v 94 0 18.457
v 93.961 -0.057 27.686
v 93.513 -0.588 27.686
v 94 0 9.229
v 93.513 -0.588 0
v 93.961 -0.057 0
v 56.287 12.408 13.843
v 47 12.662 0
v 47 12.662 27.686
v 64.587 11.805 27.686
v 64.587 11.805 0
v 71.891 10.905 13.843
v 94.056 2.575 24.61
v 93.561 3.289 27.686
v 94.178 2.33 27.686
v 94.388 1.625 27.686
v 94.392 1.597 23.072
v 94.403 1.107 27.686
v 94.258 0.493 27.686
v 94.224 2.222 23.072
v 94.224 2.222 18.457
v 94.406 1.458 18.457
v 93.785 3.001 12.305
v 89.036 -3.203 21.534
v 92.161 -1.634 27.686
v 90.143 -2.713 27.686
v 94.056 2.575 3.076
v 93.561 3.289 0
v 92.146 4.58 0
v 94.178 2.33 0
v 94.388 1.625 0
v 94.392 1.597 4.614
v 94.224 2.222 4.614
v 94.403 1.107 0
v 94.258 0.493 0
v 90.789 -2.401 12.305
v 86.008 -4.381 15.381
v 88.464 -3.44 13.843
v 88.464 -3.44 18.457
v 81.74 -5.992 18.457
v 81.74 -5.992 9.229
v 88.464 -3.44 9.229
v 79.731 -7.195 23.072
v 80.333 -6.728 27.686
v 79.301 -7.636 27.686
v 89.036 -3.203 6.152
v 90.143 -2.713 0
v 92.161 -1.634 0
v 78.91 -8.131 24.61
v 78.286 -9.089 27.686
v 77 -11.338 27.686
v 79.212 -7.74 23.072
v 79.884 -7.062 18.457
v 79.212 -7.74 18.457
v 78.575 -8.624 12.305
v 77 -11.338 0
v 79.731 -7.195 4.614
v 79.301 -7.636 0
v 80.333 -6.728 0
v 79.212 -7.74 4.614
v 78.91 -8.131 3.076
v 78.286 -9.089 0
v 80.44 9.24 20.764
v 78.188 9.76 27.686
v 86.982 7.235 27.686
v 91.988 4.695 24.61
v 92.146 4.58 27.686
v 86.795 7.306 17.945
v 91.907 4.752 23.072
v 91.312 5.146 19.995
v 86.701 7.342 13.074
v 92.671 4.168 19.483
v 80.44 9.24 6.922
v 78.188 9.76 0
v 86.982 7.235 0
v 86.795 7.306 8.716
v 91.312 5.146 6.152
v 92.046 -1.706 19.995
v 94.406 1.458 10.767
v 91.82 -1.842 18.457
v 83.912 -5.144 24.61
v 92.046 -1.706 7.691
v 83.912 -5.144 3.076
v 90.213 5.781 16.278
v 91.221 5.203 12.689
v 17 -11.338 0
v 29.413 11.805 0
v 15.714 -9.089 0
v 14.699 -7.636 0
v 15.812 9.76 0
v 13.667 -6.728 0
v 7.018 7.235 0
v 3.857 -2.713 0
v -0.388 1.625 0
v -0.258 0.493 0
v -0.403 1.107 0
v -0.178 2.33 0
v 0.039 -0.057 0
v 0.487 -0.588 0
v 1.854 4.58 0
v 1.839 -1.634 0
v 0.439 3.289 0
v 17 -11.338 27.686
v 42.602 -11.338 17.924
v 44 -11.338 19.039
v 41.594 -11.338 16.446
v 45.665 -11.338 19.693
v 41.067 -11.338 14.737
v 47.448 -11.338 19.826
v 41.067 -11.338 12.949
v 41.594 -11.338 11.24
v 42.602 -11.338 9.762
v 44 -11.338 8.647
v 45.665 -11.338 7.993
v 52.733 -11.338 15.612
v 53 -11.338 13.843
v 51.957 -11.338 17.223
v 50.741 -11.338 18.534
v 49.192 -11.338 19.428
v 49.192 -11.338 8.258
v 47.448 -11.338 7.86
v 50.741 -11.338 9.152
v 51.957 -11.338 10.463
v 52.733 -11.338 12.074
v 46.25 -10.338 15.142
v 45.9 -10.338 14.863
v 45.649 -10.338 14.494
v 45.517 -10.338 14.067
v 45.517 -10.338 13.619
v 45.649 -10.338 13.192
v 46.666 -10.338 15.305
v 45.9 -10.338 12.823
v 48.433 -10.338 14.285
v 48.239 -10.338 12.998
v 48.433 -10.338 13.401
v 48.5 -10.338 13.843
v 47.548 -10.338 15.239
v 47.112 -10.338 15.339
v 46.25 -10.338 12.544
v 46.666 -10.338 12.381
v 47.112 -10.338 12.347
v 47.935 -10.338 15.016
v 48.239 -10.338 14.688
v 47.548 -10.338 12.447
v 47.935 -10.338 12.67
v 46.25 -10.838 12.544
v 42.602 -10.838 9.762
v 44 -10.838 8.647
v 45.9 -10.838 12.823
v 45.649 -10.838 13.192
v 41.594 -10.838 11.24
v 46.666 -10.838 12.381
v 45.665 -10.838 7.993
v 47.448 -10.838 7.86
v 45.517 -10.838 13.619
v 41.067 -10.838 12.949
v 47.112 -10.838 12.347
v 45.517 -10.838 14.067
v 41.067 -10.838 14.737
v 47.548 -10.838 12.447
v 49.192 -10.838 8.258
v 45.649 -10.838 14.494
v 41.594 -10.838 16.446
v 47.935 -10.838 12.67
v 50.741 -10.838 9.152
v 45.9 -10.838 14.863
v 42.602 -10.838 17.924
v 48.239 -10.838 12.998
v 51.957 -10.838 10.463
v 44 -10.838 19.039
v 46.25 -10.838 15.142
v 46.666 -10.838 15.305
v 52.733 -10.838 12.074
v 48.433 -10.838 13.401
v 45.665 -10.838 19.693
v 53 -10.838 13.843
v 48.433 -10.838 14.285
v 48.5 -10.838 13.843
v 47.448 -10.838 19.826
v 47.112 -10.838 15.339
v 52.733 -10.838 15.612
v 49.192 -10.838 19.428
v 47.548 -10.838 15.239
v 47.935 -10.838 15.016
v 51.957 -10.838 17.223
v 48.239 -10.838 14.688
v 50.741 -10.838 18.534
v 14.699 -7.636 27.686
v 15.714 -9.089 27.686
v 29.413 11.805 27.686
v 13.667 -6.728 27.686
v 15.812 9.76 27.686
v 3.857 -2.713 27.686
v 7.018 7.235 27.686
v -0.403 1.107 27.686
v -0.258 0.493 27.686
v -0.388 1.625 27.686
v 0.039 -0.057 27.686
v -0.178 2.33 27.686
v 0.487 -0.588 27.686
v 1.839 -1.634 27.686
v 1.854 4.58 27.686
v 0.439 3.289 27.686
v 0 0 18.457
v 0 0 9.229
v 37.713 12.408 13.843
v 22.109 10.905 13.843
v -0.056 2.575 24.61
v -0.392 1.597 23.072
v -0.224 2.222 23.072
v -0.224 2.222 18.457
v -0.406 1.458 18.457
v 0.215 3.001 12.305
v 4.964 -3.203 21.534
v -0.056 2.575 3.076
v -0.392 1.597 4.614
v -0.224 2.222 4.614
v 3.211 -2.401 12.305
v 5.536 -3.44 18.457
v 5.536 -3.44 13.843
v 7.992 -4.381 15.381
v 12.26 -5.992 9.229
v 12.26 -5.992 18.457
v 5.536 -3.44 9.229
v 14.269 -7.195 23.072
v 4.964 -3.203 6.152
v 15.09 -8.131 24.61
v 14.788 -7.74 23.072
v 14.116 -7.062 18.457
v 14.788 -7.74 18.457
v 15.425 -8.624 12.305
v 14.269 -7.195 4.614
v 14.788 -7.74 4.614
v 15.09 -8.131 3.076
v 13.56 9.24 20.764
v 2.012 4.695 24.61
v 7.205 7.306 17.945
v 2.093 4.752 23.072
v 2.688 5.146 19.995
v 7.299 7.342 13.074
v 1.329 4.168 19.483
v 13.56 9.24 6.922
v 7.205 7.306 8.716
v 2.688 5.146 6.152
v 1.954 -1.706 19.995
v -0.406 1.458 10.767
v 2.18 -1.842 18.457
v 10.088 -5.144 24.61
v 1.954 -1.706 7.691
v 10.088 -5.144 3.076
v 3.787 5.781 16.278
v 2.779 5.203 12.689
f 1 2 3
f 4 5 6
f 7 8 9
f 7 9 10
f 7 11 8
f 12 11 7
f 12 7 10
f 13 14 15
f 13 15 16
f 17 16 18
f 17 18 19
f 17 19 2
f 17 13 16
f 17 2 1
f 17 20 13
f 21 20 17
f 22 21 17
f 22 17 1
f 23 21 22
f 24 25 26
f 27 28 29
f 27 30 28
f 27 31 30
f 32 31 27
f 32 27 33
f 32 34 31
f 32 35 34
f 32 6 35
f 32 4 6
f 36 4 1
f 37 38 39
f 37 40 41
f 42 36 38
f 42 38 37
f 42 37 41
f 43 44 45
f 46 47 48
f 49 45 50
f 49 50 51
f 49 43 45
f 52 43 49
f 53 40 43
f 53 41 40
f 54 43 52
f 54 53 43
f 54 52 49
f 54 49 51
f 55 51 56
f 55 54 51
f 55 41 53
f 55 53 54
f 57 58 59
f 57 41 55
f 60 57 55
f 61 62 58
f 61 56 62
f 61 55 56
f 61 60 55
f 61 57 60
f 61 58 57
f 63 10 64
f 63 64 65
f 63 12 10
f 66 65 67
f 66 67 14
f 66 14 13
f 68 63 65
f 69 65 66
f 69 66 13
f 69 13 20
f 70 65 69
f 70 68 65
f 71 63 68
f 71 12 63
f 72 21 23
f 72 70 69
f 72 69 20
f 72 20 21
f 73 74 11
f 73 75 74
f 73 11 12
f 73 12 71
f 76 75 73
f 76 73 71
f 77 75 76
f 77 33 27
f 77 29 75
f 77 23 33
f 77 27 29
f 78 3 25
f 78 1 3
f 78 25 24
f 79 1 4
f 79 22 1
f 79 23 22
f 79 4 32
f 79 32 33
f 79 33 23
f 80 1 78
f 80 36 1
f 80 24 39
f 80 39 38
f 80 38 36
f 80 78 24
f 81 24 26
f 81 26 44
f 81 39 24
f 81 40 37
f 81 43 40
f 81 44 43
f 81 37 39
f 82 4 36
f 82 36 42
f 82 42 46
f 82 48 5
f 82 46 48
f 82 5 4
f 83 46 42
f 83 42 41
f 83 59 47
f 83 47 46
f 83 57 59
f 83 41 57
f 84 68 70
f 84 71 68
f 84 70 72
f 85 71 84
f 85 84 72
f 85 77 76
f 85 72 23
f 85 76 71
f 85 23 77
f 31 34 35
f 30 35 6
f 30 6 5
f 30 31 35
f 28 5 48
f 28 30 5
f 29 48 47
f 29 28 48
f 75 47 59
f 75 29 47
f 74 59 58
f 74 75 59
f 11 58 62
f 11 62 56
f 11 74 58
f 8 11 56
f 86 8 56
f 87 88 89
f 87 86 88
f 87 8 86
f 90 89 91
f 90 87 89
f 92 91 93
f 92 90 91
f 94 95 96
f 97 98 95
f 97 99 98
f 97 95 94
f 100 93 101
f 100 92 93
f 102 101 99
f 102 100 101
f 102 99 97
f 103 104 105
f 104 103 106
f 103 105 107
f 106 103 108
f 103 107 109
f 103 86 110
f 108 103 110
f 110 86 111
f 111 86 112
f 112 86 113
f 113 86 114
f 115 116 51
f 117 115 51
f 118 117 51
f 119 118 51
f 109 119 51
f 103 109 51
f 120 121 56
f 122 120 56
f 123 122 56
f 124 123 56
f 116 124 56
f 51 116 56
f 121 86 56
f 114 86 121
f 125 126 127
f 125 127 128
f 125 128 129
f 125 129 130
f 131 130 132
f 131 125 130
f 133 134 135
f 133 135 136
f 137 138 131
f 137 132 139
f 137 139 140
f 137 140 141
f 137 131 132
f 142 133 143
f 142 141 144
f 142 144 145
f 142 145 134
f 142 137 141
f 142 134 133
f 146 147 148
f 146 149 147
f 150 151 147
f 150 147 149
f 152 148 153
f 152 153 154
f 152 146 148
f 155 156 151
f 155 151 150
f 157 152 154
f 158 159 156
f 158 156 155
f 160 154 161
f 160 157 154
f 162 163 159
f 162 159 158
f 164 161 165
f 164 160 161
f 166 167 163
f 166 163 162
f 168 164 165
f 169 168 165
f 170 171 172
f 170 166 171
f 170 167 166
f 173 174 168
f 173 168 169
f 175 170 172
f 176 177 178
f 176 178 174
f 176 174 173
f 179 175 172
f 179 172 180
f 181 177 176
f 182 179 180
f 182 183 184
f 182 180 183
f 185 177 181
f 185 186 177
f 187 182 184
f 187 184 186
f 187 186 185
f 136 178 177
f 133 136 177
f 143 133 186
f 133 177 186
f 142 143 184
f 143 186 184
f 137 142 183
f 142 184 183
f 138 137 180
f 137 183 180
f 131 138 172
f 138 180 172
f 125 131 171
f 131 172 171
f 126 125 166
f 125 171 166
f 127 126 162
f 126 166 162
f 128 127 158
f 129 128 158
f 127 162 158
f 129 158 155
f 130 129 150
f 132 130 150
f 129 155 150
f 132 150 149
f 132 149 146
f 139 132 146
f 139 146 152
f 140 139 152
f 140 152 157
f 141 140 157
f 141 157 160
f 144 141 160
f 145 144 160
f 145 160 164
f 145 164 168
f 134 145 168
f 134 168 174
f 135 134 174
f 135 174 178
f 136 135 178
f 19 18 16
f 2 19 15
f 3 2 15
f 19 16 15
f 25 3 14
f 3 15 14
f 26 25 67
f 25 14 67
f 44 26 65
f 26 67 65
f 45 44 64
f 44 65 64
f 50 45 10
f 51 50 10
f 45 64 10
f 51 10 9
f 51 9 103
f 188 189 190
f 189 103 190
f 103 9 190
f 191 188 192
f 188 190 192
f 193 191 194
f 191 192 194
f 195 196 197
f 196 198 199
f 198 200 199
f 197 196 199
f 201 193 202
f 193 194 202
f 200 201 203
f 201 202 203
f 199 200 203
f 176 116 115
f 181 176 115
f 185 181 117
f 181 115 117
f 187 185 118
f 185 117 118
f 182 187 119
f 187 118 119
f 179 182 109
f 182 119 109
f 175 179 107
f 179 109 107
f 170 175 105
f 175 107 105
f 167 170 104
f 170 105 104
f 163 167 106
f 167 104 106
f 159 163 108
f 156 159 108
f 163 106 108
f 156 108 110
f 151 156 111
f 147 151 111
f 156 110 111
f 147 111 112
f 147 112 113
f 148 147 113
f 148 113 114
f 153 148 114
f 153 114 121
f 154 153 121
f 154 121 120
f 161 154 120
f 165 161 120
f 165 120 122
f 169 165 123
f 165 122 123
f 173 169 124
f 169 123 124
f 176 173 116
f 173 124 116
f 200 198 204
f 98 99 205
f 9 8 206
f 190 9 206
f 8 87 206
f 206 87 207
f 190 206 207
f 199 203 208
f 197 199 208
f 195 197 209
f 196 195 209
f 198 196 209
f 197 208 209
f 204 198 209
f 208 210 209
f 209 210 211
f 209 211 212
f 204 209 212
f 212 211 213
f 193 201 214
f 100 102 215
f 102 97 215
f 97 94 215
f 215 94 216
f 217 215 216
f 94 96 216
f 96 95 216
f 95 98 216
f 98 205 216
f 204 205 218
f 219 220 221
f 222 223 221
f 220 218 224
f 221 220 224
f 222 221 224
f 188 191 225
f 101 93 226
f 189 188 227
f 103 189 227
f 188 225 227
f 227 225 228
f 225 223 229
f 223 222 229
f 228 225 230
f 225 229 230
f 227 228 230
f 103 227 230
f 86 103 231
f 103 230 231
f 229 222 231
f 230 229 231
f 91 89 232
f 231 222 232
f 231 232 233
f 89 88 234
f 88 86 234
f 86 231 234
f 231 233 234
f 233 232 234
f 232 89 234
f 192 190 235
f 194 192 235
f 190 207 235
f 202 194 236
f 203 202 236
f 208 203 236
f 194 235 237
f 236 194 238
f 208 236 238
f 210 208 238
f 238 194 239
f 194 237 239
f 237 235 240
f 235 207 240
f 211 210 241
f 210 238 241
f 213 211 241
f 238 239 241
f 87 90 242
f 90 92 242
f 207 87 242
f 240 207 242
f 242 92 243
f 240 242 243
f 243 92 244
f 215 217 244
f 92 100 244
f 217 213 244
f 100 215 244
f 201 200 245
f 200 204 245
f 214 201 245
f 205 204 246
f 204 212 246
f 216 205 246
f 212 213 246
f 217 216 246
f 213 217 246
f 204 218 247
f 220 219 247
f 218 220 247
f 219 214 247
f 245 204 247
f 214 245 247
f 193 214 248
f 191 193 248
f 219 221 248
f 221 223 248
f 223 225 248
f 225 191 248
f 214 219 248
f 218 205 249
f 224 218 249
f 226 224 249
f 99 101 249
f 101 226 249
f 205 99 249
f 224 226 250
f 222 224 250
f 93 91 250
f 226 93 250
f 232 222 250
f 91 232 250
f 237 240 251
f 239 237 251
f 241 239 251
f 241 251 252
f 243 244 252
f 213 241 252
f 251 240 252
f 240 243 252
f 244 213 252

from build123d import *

# Parameters (mm, degrees)
F1_DEPTH = 27.686
F2_R     = 1.5
F3_DEPTH = 1
F5_R     = 6
F6_DEPTH = 0.5


with BuildPart() as f1:
    # F0 (on Top) → F1 (new body)
    with BuildSketch(Plane.XY):
        with BuildLine():
            add(Edge.make_bspline(
                [(47, 12.6621776968), (81.0029846206, 12.4439522624), (105.8857589942, 1.0014625109), (79.8397408889, -5.9392970144), (78.9787004684, -7.8286600721), (77, -11.3378223032)],
                knots=[0, 0, 0, 0, 0.5228488812, 0.7996784343, 1, 1, 1, 1], degree=3))
            add(Edge.make_bspline(
                [(47, 12.6621776968), (12.9970153794, 12.4439522624), (-11.8857589942, 1.0014625109), (14.1602591111, -5.9392970144), (15.0212995316, -7.8286600721), (17, -11.3378223032)],
                knots=[0, 0, 0, 0, 0.5228488812, 0.7996784343, 1, 1, 1, 1], degree=3))
            Line((17, -11.3378223032), (47, -11.3378223032))
            Line((47, -11.3378223032), (77, -11.3378223032))
        make_face()
    extrude(amount=F1_DEPTH)

    # F2 (on face) → F3 (cut)
    with BuildSketch(Plane.XZ.offset(11.3378223032)):
        with Locations((47, 13.843)):
            Circle(F2_R)
    extrude(amount=-F3_DEPTH, mode=Mode.SUBTRACT)

    # F5 (on face) → F6 (cut)
    with BuildSketch(Plane.XZ.offset(11.3378223032)):
        with Locations((47, 13.843)):
            Circle(F5_R)
    extrude(amount=-F6_DEPTH, mode=Mode.SUBTRACT)


solid = f1.part
